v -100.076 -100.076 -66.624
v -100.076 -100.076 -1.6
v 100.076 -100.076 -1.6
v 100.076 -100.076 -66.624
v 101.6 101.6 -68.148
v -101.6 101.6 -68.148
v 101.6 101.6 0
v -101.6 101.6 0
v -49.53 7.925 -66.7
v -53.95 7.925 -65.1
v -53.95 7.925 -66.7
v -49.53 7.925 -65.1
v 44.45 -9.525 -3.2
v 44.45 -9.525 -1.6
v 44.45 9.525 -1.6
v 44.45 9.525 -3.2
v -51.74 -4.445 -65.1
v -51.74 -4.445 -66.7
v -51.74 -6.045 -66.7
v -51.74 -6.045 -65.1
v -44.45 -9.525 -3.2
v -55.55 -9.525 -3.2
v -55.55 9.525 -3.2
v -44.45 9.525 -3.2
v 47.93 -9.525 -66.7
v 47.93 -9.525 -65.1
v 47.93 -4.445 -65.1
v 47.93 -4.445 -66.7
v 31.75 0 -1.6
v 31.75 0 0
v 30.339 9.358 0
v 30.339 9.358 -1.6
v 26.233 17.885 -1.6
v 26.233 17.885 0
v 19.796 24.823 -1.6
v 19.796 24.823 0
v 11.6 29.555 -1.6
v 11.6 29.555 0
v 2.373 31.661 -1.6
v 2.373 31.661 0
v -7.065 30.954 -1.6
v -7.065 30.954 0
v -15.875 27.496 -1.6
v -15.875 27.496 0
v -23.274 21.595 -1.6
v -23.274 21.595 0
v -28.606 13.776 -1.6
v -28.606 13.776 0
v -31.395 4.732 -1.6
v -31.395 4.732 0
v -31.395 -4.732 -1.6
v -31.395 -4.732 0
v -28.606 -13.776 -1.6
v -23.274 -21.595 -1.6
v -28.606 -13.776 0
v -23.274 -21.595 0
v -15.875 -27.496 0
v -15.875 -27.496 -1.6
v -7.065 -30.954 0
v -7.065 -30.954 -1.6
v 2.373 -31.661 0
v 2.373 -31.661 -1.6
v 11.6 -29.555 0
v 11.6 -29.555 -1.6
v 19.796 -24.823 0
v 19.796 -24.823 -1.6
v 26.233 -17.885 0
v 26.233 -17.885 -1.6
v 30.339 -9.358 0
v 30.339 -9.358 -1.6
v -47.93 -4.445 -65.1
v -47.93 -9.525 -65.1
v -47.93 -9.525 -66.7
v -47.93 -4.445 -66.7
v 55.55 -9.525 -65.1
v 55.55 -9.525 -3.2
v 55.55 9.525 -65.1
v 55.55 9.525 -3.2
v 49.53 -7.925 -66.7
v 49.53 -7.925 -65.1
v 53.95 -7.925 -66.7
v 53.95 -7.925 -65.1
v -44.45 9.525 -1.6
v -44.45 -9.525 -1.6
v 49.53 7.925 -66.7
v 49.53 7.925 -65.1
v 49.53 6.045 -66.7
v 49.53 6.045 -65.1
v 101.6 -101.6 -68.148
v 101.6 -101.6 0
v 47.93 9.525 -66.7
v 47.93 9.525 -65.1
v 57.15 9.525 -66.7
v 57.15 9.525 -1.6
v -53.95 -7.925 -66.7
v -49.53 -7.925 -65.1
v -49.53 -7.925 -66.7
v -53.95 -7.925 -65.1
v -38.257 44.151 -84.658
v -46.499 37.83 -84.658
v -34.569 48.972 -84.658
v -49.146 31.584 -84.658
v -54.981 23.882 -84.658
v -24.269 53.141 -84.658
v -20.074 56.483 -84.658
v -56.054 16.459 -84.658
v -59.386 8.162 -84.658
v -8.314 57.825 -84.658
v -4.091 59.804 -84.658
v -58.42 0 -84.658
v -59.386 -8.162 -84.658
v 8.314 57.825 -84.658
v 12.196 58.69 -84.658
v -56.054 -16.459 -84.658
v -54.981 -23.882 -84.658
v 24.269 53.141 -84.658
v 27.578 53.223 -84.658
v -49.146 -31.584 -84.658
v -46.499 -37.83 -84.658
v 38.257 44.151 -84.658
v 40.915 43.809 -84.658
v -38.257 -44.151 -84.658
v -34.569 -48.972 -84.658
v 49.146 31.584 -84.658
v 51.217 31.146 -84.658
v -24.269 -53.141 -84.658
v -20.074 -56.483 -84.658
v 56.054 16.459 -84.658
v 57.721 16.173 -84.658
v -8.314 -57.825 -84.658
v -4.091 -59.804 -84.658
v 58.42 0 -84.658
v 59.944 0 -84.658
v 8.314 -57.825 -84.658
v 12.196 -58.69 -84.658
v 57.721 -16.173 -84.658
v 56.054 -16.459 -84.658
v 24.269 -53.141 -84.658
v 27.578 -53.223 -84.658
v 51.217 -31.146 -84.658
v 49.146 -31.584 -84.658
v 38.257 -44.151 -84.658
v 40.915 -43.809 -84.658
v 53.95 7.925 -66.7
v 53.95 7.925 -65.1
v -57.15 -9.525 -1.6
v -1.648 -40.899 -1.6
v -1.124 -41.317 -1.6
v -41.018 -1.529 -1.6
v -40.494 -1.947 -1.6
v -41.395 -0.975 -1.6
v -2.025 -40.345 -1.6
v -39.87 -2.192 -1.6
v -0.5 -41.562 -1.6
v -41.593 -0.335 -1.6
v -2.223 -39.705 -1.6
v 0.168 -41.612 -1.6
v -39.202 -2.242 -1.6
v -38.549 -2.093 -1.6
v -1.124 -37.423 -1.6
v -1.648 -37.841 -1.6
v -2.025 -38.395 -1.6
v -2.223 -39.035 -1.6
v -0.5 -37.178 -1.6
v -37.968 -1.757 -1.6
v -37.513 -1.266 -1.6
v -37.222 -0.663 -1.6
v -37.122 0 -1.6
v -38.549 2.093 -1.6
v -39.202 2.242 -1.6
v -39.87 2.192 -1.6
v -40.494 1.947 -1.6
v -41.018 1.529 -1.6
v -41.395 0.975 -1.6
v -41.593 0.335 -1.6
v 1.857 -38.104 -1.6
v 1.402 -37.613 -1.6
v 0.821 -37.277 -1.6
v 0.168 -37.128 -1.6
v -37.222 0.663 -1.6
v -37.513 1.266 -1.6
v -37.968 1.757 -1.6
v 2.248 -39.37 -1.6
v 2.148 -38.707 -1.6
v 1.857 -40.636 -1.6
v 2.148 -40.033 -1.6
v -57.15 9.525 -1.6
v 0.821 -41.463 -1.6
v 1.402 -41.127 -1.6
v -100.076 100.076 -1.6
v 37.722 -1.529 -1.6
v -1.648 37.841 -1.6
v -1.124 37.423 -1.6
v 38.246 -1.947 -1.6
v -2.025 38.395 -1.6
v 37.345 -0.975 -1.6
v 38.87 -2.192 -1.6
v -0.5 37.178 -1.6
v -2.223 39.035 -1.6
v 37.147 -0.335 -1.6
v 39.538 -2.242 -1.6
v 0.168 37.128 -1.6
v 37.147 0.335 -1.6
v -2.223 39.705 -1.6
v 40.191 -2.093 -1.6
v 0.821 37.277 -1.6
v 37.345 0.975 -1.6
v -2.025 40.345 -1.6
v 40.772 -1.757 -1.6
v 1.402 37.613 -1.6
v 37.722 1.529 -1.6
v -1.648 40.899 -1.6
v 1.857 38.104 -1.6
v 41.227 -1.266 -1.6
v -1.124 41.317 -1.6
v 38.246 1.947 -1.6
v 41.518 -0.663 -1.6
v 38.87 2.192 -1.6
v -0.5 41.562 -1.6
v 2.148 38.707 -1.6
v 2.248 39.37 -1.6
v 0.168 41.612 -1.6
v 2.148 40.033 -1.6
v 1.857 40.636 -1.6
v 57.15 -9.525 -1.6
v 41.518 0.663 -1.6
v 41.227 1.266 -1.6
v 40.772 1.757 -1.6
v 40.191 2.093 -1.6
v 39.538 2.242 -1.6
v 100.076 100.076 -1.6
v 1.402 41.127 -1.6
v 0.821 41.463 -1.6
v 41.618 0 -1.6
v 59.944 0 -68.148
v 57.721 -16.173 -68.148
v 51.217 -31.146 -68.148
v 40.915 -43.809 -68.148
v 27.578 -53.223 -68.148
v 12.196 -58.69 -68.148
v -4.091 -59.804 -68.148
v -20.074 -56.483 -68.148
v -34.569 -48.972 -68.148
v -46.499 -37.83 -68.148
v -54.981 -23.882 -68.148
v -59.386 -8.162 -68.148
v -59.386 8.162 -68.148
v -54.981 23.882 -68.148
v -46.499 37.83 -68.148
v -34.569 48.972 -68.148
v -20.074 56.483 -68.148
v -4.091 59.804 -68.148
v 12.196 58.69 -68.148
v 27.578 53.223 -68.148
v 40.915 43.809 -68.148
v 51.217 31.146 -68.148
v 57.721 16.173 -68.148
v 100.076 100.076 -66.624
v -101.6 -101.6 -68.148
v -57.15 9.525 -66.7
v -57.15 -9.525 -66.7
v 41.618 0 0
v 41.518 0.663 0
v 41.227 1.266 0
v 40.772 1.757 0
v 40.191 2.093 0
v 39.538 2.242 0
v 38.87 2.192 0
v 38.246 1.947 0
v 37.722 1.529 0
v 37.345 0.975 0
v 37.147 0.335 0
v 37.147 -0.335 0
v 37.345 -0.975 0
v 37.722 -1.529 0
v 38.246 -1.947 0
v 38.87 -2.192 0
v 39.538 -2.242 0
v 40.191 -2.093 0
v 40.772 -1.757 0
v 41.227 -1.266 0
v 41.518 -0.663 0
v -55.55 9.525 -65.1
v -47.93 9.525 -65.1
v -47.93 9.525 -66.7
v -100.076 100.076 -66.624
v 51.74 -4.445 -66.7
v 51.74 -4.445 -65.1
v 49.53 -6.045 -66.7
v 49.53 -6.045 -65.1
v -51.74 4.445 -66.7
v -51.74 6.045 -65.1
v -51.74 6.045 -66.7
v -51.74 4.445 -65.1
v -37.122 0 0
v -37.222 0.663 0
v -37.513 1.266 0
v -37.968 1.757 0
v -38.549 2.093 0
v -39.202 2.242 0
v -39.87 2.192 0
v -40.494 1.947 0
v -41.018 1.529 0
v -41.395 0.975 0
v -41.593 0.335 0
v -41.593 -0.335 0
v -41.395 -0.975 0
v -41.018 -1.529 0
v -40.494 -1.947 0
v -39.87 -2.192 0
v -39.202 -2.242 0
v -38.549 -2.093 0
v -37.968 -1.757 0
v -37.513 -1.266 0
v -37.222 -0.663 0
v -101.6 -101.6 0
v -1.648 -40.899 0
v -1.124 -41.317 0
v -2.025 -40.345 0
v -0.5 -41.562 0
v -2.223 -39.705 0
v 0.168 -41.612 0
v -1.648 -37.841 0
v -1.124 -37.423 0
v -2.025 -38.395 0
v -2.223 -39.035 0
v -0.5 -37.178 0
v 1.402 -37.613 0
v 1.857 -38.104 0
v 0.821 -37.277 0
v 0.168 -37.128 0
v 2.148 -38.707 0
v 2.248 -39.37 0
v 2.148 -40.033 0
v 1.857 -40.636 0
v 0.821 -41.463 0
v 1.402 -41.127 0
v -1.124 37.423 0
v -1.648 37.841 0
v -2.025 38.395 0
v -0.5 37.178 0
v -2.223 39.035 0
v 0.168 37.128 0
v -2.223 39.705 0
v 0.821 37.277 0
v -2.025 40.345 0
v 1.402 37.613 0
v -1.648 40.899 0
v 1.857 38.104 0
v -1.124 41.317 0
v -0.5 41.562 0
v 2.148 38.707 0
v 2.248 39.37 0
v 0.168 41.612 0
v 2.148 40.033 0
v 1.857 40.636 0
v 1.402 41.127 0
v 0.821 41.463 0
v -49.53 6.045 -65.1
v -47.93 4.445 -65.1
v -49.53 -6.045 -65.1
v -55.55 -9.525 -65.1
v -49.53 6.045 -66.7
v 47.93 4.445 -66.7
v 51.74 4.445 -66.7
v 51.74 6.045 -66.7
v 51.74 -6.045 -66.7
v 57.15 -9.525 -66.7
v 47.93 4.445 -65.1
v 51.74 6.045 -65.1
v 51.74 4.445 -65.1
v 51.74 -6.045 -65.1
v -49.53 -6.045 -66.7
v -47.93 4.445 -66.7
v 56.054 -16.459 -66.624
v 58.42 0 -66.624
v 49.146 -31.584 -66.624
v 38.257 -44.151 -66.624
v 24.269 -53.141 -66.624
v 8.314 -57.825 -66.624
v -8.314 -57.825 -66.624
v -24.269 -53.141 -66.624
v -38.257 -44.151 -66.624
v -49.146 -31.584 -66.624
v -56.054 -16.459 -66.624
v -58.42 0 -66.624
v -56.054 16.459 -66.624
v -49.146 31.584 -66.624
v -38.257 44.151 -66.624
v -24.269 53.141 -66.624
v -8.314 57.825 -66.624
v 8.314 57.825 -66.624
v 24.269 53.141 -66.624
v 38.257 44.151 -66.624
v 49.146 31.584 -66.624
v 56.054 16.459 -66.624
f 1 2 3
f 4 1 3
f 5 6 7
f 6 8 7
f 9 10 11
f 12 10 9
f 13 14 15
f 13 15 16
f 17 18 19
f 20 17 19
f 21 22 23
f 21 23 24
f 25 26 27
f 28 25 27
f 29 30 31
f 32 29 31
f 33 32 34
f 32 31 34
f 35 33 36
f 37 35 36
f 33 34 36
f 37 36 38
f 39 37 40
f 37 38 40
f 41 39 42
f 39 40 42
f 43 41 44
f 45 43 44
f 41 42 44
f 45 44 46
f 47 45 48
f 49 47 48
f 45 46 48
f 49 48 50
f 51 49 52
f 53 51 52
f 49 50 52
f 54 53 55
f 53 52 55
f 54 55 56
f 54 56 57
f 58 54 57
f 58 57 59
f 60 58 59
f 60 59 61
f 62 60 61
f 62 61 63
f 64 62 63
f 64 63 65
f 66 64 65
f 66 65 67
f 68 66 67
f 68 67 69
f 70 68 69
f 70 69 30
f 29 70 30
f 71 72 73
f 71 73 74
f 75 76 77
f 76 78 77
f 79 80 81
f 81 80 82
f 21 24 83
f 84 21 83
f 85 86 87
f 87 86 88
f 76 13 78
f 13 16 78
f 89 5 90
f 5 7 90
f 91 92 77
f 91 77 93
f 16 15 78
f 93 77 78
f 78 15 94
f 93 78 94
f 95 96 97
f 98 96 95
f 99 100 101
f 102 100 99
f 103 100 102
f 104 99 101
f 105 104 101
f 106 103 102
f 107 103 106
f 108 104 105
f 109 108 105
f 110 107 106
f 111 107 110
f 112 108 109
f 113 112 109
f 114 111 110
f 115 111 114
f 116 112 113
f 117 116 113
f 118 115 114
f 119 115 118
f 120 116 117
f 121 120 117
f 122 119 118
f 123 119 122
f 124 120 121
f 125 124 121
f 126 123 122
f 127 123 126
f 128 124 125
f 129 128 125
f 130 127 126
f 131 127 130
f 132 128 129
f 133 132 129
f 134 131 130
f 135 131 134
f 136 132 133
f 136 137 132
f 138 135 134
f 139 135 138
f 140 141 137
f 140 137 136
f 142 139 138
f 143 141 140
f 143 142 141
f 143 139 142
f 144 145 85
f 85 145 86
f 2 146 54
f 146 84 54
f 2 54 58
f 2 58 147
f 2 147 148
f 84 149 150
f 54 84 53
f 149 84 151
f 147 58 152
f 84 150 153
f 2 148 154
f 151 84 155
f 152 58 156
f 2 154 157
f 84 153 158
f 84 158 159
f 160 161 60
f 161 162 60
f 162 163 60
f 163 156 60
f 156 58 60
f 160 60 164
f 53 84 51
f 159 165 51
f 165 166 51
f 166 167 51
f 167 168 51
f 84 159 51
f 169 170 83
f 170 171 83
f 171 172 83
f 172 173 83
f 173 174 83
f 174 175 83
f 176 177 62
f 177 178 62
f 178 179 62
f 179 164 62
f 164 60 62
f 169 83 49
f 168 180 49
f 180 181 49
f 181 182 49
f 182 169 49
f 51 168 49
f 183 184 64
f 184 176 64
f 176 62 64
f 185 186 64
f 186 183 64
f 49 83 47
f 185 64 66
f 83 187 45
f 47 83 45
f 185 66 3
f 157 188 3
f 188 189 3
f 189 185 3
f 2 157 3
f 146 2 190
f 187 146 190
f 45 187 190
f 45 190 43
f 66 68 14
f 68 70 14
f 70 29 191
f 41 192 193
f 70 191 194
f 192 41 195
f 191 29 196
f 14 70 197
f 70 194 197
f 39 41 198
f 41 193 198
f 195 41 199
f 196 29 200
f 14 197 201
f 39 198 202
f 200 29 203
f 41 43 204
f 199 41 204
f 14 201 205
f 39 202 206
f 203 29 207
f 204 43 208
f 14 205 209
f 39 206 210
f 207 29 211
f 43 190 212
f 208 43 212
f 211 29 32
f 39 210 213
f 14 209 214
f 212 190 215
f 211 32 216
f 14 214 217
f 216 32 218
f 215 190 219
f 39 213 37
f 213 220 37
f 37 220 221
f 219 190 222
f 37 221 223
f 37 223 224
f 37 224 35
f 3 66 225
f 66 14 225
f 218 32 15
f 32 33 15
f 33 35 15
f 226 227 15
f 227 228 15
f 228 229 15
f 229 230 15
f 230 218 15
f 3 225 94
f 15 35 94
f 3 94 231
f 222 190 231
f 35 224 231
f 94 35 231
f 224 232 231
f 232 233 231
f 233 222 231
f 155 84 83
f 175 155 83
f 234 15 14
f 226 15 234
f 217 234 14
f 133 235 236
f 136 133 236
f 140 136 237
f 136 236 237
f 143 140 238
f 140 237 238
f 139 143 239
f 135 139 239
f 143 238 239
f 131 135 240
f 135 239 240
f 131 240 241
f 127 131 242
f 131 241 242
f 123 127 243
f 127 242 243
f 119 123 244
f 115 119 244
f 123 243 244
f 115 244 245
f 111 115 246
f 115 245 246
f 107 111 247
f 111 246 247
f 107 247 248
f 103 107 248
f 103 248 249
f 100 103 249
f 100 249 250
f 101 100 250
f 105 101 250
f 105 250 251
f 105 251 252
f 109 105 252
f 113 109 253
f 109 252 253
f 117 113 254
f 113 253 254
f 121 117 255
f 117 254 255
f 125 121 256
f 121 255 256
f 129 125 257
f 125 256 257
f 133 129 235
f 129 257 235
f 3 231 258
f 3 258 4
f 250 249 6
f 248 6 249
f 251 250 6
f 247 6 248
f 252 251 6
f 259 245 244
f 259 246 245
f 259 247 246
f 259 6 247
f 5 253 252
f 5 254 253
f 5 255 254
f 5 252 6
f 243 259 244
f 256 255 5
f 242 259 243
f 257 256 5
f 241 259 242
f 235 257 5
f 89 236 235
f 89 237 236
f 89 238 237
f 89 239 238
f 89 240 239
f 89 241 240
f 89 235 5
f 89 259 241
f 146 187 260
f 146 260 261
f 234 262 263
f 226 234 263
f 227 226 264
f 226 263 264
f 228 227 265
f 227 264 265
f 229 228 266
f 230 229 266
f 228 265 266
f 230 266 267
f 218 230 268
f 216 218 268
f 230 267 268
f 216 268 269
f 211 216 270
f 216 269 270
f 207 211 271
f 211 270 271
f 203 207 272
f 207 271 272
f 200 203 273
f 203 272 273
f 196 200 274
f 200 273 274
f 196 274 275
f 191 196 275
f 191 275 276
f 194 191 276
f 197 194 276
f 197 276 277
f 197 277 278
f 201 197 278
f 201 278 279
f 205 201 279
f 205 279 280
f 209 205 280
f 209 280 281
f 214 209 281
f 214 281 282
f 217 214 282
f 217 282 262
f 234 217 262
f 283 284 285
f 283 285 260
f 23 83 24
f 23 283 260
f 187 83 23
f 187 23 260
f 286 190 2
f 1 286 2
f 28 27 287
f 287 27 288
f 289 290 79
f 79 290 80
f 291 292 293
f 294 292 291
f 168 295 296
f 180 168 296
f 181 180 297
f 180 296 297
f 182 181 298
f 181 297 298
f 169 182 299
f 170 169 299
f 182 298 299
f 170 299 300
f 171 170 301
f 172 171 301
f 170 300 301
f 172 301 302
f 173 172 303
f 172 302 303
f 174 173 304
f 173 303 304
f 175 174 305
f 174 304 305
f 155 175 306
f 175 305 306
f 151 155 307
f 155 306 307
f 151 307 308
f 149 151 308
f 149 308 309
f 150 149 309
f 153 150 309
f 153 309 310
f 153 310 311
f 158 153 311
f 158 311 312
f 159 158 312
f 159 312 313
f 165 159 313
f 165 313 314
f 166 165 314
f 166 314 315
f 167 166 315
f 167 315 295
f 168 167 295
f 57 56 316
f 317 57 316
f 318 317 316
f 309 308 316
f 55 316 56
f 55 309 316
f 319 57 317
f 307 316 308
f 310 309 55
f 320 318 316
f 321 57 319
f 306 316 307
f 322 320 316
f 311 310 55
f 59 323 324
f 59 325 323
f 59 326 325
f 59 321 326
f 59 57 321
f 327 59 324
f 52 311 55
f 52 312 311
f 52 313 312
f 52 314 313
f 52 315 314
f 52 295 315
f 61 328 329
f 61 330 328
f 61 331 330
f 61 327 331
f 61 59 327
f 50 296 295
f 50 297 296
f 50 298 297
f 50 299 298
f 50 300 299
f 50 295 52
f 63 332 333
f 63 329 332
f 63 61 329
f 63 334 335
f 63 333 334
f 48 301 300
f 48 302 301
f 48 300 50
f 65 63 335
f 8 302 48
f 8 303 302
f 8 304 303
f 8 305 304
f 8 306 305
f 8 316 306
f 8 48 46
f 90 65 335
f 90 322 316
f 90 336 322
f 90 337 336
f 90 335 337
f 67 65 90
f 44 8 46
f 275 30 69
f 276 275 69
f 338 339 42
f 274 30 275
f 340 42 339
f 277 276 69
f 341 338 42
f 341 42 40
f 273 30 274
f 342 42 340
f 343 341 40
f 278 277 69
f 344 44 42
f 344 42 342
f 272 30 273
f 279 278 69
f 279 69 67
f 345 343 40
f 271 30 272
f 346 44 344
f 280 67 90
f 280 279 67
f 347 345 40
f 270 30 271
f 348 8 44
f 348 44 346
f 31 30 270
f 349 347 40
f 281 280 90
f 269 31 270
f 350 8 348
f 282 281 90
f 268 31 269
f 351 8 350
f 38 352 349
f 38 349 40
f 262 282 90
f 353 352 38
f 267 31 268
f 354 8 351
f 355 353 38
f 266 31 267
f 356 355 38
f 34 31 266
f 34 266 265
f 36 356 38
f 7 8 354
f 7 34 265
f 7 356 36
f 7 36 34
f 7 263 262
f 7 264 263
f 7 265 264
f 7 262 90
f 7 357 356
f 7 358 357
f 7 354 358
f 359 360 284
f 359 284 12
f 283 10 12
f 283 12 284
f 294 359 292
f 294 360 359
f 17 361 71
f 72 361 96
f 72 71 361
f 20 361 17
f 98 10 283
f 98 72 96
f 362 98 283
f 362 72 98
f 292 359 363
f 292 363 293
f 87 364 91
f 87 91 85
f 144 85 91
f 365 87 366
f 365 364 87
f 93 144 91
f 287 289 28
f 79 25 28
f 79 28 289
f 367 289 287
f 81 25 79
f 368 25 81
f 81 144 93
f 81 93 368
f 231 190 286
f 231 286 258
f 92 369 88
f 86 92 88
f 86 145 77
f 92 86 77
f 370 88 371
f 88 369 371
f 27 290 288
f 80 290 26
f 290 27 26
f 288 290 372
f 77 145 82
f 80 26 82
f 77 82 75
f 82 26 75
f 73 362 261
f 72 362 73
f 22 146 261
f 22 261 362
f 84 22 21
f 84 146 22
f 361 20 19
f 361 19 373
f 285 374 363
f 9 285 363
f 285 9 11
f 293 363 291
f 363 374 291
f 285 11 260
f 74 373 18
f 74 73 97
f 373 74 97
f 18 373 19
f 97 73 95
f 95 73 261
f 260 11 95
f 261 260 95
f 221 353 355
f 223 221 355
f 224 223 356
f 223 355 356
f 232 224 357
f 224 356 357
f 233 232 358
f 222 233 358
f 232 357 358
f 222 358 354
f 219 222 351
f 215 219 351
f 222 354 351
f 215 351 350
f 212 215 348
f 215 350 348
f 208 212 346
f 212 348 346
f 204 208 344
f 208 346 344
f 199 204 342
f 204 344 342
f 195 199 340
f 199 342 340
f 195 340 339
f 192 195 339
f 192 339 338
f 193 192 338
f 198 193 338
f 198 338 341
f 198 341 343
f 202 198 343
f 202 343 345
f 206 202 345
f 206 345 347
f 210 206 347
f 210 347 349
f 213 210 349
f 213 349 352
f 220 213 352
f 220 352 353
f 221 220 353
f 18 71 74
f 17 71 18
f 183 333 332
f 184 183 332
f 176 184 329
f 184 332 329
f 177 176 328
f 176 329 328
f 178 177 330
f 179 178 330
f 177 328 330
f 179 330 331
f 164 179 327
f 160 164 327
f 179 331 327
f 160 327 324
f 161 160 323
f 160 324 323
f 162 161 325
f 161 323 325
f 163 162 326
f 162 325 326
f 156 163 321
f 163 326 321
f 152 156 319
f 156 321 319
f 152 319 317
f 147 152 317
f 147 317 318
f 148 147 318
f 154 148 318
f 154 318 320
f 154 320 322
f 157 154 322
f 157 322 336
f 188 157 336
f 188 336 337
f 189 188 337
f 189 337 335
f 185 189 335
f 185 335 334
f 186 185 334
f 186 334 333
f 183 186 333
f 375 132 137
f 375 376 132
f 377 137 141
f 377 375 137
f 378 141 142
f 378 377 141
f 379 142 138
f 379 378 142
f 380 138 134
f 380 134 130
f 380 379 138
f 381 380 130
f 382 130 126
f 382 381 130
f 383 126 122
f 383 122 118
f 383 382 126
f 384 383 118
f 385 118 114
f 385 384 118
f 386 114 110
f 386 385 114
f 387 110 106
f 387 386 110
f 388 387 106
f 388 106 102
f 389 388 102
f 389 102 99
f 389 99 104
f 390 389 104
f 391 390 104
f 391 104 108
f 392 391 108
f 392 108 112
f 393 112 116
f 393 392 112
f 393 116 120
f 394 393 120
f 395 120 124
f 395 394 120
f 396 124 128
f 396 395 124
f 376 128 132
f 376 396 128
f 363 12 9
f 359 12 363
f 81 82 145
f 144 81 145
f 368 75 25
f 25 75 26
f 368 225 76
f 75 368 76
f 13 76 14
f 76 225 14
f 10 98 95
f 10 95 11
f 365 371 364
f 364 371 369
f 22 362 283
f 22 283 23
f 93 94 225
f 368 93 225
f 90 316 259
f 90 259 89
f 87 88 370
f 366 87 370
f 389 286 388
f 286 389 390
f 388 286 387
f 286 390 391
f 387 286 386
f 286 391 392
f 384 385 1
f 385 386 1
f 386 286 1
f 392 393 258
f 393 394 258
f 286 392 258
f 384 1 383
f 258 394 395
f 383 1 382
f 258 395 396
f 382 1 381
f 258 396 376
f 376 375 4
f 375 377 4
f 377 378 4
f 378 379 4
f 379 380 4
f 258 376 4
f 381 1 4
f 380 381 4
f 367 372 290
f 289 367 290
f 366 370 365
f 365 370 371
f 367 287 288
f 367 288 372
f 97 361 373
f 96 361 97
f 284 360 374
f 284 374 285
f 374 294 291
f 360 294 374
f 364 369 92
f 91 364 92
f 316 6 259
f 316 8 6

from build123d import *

# Parameters (mm, degrees)
F0_W      = 203.2
F0_H      = 203.2
F1_DEPTH  = 1.6002
F2_R      = 31.75
F2_R_2    = 2.2479
F3_DEPTH  = 1.6002
F5_DEPTH  = 9.525
F7_DEPTH  = 1.6002
F9_W      = 203.2
F9_H      = 203.2
F9_W_2    = 200.152
F9_H_2    = 200.152
F10_DEPTH = 65.024
F11_W     = 203.2
F11_H     = 203.2
F11_R     = 58.42
F12_DEPTH = 1.524
F13_R     = 59.944
F13_R_2   = 58.42
F14_DEPTH = 16.51


with BuildPart() as f1:
    # F0 (on Top) → F1 (new body)
    with BuildSketch(Plane.XY):
        Rectangle(F0_W, F0_H)
    extrude(amount=-F1_DEPTH)

    # F2 (on face) → F3 (cut, through all)
    with BuildSketch(Plane.XY):
        Circle(F2_R)
        with Locations((0, 39.37)):
            Circle(F2_R_2)
        with Locations((-39.37, 0)):
            Circle(F2_R_2)
        with Locations((0, -39.37)):
            Circle(F2_R_2)
        with Locations((39.37, 0)):
            Circle(F2_R_2)
    extrude(amount=-F3_DEPTH, mode=Mode.SUBTRACT)

    # F4 (on Front) → F5 (join, symmetric)
    with BuildSketch(Plane.XZ):
        Polygon((57.15, -1.6002), (44.45, -1.6002), (44.45, -3.2004), (55.5498, -3.2004), (55.5498, -65.1002), (57.15, -65.1002), align=None)
        Polygon((-57.15, -1.6002), (-57.15, -65.1002), (-55.5498, -65.1002), (-55.5498, -3.2004), (-44.45, -3.2004), (-44.45, -1.6002), align=None)
    extrude(amount=F5_DEPTH, both=True)

    # F6 (on face) → F7 (join)
    with BuildSketch(Plane(origin=(0, 0, -65.1002), x_dir=(1, 0, 0), z_dir=(0, 0, -1))):
        Polygon((47.9298, -9.525), (57.15, -9.525), (57.15, 9.525), (47.9298, 9.525), (47.9298, 4.445), (51.7398, 4.445), (51.7398, 6.0452), (49.53, 6.0452), (49.53, 7.9248), (53.9496, 7.9248), (53.9496, 0), (53.9496, -7.9248), (49.53, -7.9248), (49.53, -6.0452), (51.7398, -6.0452), (51.7398, -4.445), (47.9298, -4.445), align=None)
    extrude(amount=F7_DEPTH)

    # F8: F1 across plane


with BuildPart() as f1_1:
    add(f1.part)
    add(f1.part.mirror(Plane.YZ))

    # F9 (on face) → F10 (join)
    with BuildSketch(Plane(origin=(0, 0, -1.6002), x_dir=(1, 0, 0), z_dir=(0, 0, -1))):
        Rectangle(F9_W, F9_H)
        Rectangle(F9_W_2, F9_H_2, mode=Mode.SUBTRACT)
    extrude(amount=F10_DEPTH)

    # F11 (on face) → F12 (join)
    with BuildSketch(Plane(origin=(0, 0, -66.6242), x_dir=(1, 0, 0), z_dir=(0, 0, -1))):
        Rectangle(F11_W, F11_H)
        Circle(F11_R, mode=Mode.SUBTRACT)
    extrude(amount=F12_DEPTH)

    # F13 (on face) → F14 (join)
    with BuildSketch(Plane(origin=(0, 0, -68.1482), x_dir=(1, 0, 0), z_dir=(0, 0, -1))):
        Circle(F13_R)
        Circle(F13_R_2, mode=Mode.SUBTRACT)
    extrude(amount=F14_DEPTH)


solid = f1_1.part
